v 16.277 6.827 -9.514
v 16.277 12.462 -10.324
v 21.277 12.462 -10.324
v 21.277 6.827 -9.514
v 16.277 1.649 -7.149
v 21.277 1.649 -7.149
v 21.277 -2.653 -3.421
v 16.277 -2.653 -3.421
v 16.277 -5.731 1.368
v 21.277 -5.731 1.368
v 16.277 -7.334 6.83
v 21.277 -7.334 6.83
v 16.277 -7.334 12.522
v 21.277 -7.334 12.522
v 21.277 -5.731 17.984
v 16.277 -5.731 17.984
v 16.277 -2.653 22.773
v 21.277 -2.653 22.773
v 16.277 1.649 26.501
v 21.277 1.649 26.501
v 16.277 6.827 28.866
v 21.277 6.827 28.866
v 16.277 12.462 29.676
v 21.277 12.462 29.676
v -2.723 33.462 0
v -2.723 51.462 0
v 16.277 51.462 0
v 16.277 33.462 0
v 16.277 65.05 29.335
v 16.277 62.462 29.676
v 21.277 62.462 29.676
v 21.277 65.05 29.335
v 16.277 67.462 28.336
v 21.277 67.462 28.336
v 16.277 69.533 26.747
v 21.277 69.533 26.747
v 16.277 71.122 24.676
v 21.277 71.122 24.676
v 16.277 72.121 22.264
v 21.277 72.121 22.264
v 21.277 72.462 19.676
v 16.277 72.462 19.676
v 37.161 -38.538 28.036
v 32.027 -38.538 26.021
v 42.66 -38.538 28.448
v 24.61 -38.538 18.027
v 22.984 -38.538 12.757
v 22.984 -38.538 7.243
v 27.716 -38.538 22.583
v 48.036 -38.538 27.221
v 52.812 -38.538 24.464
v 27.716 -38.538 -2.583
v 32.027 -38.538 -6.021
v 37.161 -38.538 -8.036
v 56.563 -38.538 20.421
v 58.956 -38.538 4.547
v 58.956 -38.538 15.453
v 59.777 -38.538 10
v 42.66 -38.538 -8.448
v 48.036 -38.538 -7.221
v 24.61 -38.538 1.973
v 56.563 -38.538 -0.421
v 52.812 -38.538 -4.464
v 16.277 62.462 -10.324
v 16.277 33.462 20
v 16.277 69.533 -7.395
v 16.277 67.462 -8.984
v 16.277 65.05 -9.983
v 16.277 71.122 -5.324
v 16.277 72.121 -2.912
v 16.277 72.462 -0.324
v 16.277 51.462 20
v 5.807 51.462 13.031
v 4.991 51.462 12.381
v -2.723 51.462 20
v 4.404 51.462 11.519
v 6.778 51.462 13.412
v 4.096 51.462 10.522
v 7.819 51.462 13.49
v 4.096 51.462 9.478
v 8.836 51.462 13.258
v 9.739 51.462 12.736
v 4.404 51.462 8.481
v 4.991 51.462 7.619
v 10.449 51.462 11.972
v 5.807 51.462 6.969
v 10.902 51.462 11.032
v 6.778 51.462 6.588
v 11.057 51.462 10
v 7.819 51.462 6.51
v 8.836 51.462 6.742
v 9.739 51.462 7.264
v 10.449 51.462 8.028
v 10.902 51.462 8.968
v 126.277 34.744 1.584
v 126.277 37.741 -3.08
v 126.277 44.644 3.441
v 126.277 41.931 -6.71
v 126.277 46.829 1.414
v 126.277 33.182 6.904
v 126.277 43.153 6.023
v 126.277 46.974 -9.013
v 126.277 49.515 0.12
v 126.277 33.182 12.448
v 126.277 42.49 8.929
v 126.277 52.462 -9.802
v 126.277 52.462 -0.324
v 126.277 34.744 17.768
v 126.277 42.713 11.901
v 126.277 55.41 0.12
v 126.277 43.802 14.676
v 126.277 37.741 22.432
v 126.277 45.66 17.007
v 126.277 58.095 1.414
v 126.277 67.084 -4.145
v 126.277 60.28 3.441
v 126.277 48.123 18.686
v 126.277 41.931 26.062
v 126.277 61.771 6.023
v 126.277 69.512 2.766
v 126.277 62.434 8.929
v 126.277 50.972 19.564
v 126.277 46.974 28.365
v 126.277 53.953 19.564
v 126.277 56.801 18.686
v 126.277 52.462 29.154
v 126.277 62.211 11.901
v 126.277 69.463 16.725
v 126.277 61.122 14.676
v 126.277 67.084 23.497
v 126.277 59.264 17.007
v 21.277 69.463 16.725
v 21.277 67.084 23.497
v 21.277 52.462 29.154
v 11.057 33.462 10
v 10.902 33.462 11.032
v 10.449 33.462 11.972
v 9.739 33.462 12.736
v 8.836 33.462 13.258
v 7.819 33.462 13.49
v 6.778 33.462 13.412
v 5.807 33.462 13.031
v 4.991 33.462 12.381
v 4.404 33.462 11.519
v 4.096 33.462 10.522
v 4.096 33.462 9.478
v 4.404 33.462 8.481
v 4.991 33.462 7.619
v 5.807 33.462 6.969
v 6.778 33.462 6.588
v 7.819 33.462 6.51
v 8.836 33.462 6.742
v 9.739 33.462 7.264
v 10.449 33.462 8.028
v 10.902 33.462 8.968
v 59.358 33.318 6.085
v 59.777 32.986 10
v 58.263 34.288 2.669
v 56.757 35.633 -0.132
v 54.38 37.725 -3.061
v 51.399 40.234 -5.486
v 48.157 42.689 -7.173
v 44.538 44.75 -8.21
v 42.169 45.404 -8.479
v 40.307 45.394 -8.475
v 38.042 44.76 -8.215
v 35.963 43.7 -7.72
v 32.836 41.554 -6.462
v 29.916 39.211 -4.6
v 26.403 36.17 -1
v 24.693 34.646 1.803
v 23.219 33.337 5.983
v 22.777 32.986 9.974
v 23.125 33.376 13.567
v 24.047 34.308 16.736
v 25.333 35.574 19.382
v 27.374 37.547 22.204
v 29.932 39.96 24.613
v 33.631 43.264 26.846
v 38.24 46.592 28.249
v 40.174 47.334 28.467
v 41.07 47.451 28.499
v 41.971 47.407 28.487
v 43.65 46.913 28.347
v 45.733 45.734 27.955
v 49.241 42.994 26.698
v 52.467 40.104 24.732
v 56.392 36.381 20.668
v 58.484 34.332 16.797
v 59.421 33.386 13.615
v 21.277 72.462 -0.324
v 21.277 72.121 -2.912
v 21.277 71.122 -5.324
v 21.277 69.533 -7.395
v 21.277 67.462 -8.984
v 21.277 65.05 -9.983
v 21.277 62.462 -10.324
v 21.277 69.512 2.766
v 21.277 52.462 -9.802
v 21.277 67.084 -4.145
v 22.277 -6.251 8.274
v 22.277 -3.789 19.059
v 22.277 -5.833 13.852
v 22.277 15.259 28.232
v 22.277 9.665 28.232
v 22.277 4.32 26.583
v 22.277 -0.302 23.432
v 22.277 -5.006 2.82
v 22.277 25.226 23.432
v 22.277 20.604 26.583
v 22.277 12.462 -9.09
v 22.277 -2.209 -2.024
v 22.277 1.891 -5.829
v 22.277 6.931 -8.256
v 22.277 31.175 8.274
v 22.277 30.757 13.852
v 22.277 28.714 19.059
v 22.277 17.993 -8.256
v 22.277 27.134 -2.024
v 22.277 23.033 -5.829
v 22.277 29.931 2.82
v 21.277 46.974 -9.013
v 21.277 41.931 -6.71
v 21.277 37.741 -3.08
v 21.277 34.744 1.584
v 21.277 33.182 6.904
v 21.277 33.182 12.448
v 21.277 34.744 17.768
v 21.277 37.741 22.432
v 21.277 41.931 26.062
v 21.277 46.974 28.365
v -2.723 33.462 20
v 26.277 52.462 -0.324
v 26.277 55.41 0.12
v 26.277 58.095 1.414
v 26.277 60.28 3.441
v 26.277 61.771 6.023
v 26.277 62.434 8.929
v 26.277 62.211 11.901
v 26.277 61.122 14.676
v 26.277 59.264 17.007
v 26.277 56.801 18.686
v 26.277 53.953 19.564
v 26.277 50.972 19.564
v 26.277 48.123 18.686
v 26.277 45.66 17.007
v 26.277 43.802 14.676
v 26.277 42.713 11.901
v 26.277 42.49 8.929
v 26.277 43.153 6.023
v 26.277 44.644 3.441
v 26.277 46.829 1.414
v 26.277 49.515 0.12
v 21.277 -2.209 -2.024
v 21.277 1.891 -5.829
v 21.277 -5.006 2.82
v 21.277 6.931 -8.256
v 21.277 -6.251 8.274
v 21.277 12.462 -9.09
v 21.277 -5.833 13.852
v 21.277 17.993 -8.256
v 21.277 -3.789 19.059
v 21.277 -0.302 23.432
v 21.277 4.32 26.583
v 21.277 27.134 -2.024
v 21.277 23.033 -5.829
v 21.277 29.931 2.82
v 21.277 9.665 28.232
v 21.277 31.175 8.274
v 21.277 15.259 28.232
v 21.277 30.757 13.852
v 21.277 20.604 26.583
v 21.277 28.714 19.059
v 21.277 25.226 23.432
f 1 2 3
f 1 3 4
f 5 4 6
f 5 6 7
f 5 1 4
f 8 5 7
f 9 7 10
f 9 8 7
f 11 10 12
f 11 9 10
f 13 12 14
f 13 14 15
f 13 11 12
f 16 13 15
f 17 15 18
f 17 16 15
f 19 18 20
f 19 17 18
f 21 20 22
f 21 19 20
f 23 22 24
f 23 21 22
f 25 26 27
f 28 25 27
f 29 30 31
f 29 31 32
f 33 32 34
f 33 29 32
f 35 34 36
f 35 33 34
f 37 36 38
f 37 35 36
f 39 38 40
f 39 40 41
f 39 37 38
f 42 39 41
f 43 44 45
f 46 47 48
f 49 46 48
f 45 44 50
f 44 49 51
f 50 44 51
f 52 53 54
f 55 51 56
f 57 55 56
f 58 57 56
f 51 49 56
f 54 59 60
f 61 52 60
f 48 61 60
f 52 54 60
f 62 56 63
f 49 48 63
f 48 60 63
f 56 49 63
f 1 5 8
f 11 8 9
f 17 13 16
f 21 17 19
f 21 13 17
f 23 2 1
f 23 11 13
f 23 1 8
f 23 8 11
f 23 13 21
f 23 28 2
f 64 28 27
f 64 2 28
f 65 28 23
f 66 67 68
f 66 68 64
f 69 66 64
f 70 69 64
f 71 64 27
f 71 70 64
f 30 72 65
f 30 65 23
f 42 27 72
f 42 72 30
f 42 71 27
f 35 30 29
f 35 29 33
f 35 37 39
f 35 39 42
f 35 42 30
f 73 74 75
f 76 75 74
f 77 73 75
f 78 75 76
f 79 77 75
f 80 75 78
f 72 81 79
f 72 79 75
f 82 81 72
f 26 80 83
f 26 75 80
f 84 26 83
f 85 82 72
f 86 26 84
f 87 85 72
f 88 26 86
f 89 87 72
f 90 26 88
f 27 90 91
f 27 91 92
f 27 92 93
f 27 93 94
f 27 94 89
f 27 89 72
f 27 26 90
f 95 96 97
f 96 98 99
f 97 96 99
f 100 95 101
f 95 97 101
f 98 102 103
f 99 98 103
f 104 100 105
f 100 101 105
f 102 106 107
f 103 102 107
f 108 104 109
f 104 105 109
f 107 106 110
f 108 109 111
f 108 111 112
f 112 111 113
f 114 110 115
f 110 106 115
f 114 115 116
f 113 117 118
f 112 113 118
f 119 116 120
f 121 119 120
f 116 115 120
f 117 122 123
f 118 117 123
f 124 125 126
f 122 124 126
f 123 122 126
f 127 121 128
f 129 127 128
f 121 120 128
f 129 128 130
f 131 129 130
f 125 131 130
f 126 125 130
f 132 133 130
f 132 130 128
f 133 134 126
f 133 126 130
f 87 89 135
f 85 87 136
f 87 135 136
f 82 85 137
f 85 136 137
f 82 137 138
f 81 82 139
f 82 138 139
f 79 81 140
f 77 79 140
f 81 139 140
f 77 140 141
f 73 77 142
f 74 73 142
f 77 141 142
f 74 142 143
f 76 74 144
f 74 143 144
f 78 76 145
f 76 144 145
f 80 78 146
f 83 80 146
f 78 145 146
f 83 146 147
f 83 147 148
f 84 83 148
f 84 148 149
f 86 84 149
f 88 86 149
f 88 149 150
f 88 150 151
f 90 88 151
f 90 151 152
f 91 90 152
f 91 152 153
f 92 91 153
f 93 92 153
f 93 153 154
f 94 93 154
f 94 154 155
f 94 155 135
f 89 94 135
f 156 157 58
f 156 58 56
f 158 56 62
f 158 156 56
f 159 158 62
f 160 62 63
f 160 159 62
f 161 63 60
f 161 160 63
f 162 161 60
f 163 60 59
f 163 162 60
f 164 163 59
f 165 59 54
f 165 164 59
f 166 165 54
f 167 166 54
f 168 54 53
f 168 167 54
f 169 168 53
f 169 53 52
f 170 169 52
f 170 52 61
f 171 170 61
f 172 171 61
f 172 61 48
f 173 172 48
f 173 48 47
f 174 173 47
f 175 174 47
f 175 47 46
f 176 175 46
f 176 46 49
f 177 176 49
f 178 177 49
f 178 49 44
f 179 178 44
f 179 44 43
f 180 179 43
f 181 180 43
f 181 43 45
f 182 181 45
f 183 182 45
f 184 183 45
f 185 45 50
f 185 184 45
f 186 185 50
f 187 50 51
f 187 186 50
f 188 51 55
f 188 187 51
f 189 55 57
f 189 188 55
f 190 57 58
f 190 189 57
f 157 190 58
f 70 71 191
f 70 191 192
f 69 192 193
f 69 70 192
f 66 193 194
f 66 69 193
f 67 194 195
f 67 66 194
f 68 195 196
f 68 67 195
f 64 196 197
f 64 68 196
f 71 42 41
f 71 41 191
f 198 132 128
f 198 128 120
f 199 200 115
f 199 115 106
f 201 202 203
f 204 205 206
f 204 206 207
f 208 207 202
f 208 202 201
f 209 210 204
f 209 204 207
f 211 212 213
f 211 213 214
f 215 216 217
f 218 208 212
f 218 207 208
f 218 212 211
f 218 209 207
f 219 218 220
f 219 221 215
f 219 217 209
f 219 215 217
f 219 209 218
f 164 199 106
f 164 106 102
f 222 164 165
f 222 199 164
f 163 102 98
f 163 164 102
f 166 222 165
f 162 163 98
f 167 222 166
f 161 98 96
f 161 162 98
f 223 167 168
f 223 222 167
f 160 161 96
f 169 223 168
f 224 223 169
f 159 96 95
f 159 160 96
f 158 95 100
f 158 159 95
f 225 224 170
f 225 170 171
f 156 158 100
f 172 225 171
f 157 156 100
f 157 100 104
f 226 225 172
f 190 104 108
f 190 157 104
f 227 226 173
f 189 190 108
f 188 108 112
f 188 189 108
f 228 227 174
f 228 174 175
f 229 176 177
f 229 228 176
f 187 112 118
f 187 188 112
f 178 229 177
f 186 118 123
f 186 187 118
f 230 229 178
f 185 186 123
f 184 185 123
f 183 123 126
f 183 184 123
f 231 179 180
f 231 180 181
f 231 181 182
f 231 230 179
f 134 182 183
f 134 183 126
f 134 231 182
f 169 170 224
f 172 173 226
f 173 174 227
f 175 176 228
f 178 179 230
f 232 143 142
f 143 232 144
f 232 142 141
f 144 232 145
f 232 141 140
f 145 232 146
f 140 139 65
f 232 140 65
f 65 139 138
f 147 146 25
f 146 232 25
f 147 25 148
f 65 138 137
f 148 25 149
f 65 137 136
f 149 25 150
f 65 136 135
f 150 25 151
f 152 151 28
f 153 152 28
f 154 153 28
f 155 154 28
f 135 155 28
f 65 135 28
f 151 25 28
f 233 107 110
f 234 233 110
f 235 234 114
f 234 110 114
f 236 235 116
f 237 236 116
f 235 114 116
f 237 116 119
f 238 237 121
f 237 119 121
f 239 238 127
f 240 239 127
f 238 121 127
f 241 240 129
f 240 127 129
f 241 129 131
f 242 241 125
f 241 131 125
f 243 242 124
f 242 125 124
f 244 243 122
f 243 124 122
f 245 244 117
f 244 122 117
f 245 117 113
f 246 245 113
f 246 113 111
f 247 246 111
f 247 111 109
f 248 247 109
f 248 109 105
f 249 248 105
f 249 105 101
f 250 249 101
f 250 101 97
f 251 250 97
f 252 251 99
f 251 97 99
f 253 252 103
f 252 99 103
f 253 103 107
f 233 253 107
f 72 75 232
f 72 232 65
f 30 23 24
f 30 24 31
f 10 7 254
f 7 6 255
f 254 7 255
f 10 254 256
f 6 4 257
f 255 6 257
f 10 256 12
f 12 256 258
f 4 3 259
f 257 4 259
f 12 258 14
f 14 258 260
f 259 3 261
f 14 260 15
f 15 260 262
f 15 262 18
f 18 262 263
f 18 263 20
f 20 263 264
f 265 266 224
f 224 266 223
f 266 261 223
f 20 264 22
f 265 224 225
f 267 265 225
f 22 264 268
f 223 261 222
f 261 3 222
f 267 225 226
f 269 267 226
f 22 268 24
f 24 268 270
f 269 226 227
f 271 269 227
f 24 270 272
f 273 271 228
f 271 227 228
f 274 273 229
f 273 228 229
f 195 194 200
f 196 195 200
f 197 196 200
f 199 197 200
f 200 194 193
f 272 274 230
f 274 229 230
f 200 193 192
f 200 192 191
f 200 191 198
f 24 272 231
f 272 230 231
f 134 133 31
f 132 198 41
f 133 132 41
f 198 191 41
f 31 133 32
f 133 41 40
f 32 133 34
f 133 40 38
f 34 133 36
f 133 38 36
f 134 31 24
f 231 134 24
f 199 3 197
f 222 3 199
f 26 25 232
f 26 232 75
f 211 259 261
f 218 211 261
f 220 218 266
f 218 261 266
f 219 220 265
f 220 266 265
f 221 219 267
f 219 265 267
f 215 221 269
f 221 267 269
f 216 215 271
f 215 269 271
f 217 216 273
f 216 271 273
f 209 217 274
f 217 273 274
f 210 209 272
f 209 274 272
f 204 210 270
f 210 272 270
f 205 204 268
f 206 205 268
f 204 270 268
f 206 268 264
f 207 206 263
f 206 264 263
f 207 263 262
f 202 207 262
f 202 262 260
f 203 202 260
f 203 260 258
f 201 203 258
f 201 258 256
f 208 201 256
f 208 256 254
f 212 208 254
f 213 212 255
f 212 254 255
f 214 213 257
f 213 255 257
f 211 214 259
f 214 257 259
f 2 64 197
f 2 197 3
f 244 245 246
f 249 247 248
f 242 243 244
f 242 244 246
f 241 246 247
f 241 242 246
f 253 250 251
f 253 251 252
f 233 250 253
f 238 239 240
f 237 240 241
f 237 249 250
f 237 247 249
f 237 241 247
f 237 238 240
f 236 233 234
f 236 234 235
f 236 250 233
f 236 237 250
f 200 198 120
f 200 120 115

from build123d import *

# Parameters (mm, degrees)
SKETCH_1_W               = 19
SKETCH_1_H               = 18
EXTRUDE_1_DEPTH          = 20
EXTRUDE_2_DEPTH          = 5
SKETCH_4_R               = 18.765633517
EXTRUDE_4_DEPTH          = 1
EXTRUDE_5_DEPTH          = 105
SKETCH_12_R              = 18.5
EXTRUDE_13_DEPTH         = 90
SKETCH_13_R              = 3.5
CUT_EXTRUDE_2_DEPTH      = 20
CUT_EXTRUDE_2_DEPTH_BACK = 40
SKETCH_6_R               = 10
CUT_EXTRUDE_3_DEPTH      = 100


with BuildPart() as part:
    # 草图1 → 凸台-拉伸1 (new body)
    with BuildSketch(Plane.XY):
        with Locations((6.777447397, 42.462092888)):
            Rectangle(SKETCH_1_W, SKETCH_1_H)
    extrude(amount=EXTRUDE_1_DEPTH)

    # 草图2 → 凸台-拉伸2 (add)
    with BuildSketch(Plane(origin=(16.277447397, 0, 0), x_dir=(0, 0, -1), z_dir=(1, 0, 0))):
        with BuildLine():
            Line((-29.676018319, 12.462092888), (-29.676018319, 42.462092888))
            Line((-29.676018319, 42.462092888), (-29.676018319, 62.462092888))
            ThreePointArc((-29.676018319, 62.462092888), (-26.747086131, 69.5331607), (-19.676018319, 72.462092888))
            Line((-19.676018319, 72.462092888), (0.323981681, 72.462092888))
            ThreePointArc((0.323981681, 72.462092888), (7.395049493, 69.5331607), (10.323981681, 62.462092888))
            Line((10.323981681, 62.462092888), (10.323981681, 42.462092888))
            Line((10.323981681, 42.462092888), (10.323981681, 12.462092888))
            ThreePointArc((10.323981681, 12.462092888), (-9.676018319, -7.537907112), (-29.676018319, 12.462092888))
        make_face()
    extrude(amount=EXTRUDE_2_DEPTH)

    # 草图4 → 凸台-拉伸4 (add)
    with BuildSketch(Plane(origin=(21.277447397, 0, 0), x_dir=(0, 0, -1), z_dir=(1, 0, 0))):
        with Locations((-9.676018319, 12.462092888)):
            Circle(SKETCH_4_R)
    extrude(amount=EXTRUDE_4_DEPTH)

    # 草图5 → 凸台-拉伸5 (add)
    with BuildSketch(Plane(origin=(21.277447397, 0, 0), x_dir=(0, 0, -1), z_dir=(1, 0, 0))):
        with BuildLine():
            Line((-29.154370976, 52.462092888), (-23.49669222, 67.083579023))
            Line((-23.49669222, 67.083579023), (-16.725326826, 69.463174846))
            Line((-16.725326826, 69.463174846), (-2.765681369, 69.512012284))
            Line((-2.765681369, 69.512012284), (4.144655582, 67.083579023))
            Line((4.144655582, 67.083579023), (9.802334338, 52.462092888))
            ThreePointArc((9.802334338, 52.462092888), (-9.676018319, 32.983740231), (-29.154370976, 52.462092888))
        make_face()
    extrude(amount=EXTRUDE_5_DEPTH)

    # 草图12 → 凸台-拉伸13 (add)
    with BuildSketch(Plane(origin=(0, 51.462092888, 0), x_dir=(1, 0, 0), z_dir=(0, 1, 0))):
        with Locations((41.277447397, -10)):
            Circle(SKETCH_12_R)
    extrude(amount=-EXTRUDE_13_DEPTH)

    # 草图13 → 切除-拉伸2 (cut, two sides)
    with BuildSketch(Plane.XZ.offset(-33.462092888)) as cut_extrude_2_sk:
        with Locations((7.557005132, 10)):
            Circle(SKETCH_13_R)
    extrude(amount=CUT_EXTRUDE_2_DEPTH, mode=Mode.SUBTRACT)
    extrude(cut_extrude_2_sk.sketch, amount=-CUT_EXTRUDE_2_DEPTH_BACK, mode=Mode.SUBTRACT)

    # 草图6 → 切除-拉伸3 (cut)
    with BuildSketch(Plane(origin=(126.277447397, 0, 0), x_dir=(0, 0, -1), z_dir=(1, 0, 0))):
        with Locations((-9.676018319, 52.462092888)):
            Circle(SKETCH_6_R)
    extrude(amount=-CUT_EXTRUDE_3_DEPTH, mode=Mode.SUBTRACT)


solid = part.part
